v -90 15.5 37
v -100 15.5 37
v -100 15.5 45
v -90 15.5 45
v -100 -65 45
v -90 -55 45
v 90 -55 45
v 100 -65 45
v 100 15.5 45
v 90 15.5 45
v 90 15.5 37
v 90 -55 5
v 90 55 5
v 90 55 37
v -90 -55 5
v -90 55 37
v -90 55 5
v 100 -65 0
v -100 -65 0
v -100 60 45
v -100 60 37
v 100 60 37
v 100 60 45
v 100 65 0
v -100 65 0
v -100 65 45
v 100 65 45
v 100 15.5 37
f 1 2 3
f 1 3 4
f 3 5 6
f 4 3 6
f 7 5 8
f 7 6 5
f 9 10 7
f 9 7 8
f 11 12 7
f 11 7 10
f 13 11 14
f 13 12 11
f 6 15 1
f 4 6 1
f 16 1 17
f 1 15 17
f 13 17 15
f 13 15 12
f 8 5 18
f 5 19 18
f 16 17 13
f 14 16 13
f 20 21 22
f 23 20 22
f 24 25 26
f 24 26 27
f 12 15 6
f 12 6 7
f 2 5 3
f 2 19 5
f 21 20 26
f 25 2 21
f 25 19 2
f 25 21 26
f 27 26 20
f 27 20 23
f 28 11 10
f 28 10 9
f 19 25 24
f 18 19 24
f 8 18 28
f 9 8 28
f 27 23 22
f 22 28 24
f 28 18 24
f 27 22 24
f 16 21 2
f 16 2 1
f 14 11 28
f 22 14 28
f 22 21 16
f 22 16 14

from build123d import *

# Parameters (mm, degrees)
F0_W      = 200
F0_H      = 130
F1_DEPTH  = 5
F2_W      = 200
F2_H      = 10
F3_DEPTH  = 32
F4_W      = 200
F4_H      = 5
F5_DEPTH  = 8
F6_W      = 10
F6_H      = 120
F7_DEPTH  = 32
F8_W      = 10
F8_H      = 120
F9_DEPTH  = 32
F10_W     = 180
F10_H     = 10
F11_DEPTH = 40
F12_W     = 10
F12_H     = 80.5
F13_DEPTH = 8
F14_W     = 10
F14_H     = 80.5
F15_DEPTH = 8


with BuildPart() as f1:
    # F0 (on Top) → F1 (new body)
    with BuildSketch(Plane.XY):
        Rectangle(F0_W, F0_H)
    extrude(amount=F1_DEPTH)

    # F2 (on face) → F3 (join)
    with BuildSketch(Plane.XY.offset(5)):
        with Locations((0, 60)):
            Rectangle(F2_W, F2_H)
    extrude(amount=F3_DEPTH)

    # F4 (on face) → F5 (join)
    with BuildSketch(Plane.XY.offset(37)):
        with Locations((0, 62.5)):
            Rectangle(F4_W, F4_H)
    extrude(amount=F5_DEPTH)

    # F6 (on face) → F7 (join)
    with BuildSketch(Plane.XY.offset(5)):
        with Locations((-95, -5)):
            Rectangle(F6_W, F6_H)
    extrude(amount=F7_DEPTH)

    # F8 (on face) → F9 (join)
    with BuildSketch(Plane.XY.offset(5)):
        with Locations((95, -5)):
            Rectangle(F8_W, F8_H)
    extrude(amount=F9_DEPTH)

    # F10 (on face) → F11 (join)
    with BuildSketch(Plane.XY.offset(5)):
        with Locations((0, -60)):
            Rectangle(F10_W, F10_H)
    extrude(amount=F11_DEPTH)

    # F12 (on face) → F13 (join)
    with BuildSketch(Plane.XY.offset(37)):
        with Locations((95, -24.75)):
            Rectangle(F12_W, F12_H)
    extrude(amount=F13_DEPTH)

    # F14 (on face) → F15 (join)
    with BuildSketch(Plane.XY.offset(37)):
        with Locations((-95, -24.75)):
            Rectangle(F14_W, F14_H)
    extrude(amount=F15_DEPTH)


solid = f1.part
